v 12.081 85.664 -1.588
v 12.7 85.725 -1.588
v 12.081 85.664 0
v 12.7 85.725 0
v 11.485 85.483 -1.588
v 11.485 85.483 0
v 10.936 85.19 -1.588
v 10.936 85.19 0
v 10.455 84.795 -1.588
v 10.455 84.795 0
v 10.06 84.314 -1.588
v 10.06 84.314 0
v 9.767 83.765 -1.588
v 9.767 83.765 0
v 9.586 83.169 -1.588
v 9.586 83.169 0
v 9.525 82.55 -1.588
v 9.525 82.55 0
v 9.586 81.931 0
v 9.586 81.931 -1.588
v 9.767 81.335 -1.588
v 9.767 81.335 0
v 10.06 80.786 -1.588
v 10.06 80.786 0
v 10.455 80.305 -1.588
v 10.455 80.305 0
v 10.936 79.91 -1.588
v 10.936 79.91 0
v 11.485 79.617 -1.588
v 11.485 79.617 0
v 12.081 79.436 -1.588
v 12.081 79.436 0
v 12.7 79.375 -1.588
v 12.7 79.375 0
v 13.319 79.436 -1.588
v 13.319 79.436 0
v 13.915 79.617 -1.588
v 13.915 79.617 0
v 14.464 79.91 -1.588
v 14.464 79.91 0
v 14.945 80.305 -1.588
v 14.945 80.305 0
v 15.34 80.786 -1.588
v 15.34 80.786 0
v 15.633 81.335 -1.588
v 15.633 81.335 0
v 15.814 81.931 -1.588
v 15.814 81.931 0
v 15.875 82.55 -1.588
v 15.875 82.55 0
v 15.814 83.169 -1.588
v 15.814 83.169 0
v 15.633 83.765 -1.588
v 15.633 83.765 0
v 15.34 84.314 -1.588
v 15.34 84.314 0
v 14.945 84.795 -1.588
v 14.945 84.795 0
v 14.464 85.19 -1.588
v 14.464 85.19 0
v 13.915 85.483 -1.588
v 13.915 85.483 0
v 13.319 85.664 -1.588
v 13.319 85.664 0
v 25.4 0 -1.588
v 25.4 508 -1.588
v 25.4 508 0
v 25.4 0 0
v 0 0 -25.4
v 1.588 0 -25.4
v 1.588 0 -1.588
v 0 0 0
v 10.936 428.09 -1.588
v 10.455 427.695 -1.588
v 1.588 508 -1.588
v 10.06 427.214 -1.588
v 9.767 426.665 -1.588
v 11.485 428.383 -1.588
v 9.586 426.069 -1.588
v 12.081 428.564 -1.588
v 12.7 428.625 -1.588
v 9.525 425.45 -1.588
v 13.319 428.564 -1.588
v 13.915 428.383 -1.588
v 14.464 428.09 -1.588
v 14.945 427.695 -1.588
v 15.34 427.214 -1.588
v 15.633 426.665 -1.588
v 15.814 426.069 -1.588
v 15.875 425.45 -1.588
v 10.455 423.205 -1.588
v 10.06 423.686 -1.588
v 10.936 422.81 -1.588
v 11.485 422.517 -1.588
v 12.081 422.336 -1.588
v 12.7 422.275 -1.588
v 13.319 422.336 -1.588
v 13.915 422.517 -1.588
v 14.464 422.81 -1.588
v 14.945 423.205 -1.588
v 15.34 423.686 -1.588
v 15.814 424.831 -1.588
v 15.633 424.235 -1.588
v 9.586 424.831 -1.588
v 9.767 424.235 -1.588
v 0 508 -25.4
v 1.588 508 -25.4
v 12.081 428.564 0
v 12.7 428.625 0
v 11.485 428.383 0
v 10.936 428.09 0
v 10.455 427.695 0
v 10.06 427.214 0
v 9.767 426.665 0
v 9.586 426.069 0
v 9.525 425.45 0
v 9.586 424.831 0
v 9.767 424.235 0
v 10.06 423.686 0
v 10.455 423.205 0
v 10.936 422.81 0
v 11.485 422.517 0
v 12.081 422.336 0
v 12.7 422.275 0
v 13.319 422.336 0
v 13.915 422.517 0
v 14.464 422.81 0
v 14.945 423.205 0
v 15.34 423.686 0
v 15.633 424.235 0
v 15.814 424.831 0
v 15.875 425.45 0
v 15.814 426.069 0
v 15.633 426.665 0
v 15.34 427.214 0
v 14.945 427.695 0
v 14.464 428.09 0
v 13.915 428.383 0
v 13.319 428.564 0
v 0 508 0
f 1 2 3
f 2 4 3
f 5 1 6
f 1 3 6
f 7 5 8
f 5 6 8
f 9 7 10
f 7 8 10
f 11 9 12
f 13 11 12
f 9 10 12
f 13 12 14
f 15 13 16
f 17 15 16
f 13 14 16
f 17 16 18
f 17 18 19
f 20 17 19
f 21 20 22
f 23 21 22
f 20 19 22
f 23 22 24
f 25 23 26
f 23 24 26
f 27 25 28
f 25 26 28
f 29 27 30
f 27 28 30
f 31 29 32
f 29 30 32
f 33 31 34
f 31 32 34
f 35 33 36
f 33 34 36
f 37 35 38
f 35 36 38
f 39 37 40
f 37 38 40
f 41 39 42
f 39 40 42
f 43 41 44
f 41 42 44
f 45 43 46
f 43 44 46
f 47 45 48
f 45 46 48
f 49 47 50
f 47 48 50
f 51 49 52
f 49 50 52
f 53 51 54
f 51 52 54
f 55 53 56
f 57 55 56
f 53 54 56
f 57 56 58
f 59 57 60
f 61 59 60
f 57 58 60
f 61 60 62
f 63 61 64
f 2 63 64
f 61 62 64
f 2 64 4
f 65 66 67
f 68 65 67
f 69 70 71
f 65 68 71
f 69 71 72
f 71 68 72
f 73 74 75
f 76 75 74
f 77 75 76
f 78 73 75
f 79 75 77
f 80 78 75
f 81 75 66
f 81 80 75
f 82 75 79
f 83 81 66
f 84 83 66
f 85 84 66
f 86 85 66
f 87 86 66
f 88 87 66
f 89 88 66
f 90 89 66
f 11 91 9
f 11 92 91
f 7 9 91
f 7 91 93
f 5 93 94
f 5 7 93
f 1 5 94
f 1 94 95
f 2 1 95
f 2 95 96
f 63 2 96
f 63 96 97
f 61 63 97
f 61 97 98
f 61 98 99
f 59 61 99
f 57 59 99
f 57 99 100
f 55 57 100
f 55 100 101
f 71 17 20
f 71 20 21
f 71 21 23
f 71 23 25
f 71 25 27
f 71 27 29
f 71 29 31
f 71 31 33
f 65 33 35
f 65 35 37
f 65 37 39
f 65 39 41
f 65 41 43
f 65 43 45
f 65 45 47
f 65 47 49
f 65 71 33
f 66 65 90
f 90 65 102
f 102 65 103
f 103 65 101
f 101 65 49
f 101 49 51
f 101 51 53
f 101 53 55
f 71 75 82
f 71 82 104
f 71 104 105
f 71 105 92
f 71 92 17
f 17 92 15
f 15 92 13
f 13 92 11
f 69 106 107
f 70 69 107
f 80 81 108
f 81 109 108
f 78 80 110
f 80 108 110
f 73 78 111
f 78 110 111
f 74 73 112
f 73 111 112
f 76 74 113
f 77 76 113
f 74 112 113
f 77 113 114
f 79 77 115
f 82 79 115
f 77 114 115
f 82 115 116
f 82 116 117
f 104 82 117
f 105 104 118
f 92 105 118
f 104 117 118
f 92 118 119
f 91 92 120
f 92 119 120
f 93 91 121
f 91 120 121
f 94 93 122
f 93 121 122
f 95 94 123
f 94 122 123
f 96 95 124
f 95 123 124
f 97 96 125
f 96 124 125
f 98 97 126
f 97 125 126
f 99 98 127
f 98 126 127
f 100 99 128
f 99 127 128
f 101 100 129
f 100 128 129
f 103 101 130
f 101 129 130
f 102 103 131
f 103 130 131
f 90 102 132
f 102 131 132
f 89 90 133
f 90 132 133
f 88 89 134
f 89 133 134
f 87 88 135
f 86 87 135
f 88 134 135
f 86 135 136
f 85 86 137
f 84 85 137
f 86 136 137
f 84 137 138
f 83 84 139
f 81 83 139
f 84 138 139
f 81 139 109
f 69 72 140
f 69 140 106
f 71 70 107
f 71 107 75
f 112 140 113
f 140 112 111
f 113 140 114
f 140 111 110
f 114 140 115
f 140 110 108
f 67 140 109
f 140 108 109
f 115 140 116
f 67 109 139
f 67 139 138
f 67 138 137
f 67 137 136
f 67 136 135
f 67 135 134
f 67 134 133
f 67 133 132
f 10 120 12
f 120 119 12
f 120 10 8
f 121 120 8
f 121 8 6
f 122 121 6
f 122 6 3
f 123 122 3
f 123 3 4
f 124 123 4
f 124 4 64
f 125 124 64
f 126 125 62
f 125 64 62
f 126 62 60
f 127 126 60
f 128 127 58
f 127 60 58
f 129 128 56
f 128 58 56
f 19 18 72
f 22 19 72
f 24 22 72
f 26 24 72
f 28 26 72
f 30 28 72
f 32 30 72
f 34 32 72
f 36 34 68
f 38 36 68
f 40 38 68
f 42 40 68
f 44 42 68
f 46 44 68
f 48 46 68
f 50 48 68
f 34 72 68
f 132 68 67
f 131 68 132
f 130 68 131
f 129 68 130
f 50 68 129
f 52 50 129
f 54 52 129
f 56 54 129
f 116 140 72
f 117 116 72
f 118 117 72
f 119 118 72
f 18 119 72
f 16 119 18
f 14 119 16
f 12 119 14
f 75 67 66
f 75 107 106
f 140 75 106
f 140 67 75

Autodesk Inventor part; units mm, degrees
ref_plane "YZ Plane" through (0, 0, 0) normal (1, 0, 0) x (0, 1, 0)
ref_plane "XZ Plane" through (0, 0, 0) normal (0, 1, 0) x (-1, 0, 0)
ref_plane "XY Plane" through (0, 0, 0) normal (0, 0, 1) x (1, 0, 0)
sketch "Sketch1" plane through (0, 0, 0) normal (0, 1, 0) x (-1, 0, 0)
  line L0 (0, 0) -> (-25.4, 0)
  line L1 (0, 0) -> (0, -25.4)
  line L2 (-1.5875, -25.4) -> (-1.5875, -1.5875)
  line L3 (-1.5875, -1.5875) -> (-25.4, -1.5875)
  line L4 (0, -25.4) -> (-1.5875, -25.4)
  line L5 (-25.4, -1.5875) -> (-25.4, 0)
  dimension "d5" = 25.4
  dimension "d6" = 25.4
  dimension "d7" = 1.5875
extrude "Extrusion1" add sketch "Sketch1" along normal blind 508
sketch "Sketch2" plane through (25.4, 0, -1.5875) normal (0, 0, -1) x (-1, 0, 0)
  line L0 (0, 508) -> (23.8125, 508) projected
  line L1 (25.4, 0) -> (0, 0) projected
  line L2 (0, 0) -> (0, 508) projected
  point P0 (12.7, 425.45)
  point P1 (12.7, 82.55)
  dimension "d10" = 82.55
  dimension "d11" = 82.55
  dimension "d12" = 12.7
  dimension "d13" = 12.7
hole "Hole1" at (12.7, 425.45, -1.5875) at (12.7, 82.55, -1.5875) direction (0, 0, 1) diameter 6.35 end through all
properties part number "gripper main bracket"
